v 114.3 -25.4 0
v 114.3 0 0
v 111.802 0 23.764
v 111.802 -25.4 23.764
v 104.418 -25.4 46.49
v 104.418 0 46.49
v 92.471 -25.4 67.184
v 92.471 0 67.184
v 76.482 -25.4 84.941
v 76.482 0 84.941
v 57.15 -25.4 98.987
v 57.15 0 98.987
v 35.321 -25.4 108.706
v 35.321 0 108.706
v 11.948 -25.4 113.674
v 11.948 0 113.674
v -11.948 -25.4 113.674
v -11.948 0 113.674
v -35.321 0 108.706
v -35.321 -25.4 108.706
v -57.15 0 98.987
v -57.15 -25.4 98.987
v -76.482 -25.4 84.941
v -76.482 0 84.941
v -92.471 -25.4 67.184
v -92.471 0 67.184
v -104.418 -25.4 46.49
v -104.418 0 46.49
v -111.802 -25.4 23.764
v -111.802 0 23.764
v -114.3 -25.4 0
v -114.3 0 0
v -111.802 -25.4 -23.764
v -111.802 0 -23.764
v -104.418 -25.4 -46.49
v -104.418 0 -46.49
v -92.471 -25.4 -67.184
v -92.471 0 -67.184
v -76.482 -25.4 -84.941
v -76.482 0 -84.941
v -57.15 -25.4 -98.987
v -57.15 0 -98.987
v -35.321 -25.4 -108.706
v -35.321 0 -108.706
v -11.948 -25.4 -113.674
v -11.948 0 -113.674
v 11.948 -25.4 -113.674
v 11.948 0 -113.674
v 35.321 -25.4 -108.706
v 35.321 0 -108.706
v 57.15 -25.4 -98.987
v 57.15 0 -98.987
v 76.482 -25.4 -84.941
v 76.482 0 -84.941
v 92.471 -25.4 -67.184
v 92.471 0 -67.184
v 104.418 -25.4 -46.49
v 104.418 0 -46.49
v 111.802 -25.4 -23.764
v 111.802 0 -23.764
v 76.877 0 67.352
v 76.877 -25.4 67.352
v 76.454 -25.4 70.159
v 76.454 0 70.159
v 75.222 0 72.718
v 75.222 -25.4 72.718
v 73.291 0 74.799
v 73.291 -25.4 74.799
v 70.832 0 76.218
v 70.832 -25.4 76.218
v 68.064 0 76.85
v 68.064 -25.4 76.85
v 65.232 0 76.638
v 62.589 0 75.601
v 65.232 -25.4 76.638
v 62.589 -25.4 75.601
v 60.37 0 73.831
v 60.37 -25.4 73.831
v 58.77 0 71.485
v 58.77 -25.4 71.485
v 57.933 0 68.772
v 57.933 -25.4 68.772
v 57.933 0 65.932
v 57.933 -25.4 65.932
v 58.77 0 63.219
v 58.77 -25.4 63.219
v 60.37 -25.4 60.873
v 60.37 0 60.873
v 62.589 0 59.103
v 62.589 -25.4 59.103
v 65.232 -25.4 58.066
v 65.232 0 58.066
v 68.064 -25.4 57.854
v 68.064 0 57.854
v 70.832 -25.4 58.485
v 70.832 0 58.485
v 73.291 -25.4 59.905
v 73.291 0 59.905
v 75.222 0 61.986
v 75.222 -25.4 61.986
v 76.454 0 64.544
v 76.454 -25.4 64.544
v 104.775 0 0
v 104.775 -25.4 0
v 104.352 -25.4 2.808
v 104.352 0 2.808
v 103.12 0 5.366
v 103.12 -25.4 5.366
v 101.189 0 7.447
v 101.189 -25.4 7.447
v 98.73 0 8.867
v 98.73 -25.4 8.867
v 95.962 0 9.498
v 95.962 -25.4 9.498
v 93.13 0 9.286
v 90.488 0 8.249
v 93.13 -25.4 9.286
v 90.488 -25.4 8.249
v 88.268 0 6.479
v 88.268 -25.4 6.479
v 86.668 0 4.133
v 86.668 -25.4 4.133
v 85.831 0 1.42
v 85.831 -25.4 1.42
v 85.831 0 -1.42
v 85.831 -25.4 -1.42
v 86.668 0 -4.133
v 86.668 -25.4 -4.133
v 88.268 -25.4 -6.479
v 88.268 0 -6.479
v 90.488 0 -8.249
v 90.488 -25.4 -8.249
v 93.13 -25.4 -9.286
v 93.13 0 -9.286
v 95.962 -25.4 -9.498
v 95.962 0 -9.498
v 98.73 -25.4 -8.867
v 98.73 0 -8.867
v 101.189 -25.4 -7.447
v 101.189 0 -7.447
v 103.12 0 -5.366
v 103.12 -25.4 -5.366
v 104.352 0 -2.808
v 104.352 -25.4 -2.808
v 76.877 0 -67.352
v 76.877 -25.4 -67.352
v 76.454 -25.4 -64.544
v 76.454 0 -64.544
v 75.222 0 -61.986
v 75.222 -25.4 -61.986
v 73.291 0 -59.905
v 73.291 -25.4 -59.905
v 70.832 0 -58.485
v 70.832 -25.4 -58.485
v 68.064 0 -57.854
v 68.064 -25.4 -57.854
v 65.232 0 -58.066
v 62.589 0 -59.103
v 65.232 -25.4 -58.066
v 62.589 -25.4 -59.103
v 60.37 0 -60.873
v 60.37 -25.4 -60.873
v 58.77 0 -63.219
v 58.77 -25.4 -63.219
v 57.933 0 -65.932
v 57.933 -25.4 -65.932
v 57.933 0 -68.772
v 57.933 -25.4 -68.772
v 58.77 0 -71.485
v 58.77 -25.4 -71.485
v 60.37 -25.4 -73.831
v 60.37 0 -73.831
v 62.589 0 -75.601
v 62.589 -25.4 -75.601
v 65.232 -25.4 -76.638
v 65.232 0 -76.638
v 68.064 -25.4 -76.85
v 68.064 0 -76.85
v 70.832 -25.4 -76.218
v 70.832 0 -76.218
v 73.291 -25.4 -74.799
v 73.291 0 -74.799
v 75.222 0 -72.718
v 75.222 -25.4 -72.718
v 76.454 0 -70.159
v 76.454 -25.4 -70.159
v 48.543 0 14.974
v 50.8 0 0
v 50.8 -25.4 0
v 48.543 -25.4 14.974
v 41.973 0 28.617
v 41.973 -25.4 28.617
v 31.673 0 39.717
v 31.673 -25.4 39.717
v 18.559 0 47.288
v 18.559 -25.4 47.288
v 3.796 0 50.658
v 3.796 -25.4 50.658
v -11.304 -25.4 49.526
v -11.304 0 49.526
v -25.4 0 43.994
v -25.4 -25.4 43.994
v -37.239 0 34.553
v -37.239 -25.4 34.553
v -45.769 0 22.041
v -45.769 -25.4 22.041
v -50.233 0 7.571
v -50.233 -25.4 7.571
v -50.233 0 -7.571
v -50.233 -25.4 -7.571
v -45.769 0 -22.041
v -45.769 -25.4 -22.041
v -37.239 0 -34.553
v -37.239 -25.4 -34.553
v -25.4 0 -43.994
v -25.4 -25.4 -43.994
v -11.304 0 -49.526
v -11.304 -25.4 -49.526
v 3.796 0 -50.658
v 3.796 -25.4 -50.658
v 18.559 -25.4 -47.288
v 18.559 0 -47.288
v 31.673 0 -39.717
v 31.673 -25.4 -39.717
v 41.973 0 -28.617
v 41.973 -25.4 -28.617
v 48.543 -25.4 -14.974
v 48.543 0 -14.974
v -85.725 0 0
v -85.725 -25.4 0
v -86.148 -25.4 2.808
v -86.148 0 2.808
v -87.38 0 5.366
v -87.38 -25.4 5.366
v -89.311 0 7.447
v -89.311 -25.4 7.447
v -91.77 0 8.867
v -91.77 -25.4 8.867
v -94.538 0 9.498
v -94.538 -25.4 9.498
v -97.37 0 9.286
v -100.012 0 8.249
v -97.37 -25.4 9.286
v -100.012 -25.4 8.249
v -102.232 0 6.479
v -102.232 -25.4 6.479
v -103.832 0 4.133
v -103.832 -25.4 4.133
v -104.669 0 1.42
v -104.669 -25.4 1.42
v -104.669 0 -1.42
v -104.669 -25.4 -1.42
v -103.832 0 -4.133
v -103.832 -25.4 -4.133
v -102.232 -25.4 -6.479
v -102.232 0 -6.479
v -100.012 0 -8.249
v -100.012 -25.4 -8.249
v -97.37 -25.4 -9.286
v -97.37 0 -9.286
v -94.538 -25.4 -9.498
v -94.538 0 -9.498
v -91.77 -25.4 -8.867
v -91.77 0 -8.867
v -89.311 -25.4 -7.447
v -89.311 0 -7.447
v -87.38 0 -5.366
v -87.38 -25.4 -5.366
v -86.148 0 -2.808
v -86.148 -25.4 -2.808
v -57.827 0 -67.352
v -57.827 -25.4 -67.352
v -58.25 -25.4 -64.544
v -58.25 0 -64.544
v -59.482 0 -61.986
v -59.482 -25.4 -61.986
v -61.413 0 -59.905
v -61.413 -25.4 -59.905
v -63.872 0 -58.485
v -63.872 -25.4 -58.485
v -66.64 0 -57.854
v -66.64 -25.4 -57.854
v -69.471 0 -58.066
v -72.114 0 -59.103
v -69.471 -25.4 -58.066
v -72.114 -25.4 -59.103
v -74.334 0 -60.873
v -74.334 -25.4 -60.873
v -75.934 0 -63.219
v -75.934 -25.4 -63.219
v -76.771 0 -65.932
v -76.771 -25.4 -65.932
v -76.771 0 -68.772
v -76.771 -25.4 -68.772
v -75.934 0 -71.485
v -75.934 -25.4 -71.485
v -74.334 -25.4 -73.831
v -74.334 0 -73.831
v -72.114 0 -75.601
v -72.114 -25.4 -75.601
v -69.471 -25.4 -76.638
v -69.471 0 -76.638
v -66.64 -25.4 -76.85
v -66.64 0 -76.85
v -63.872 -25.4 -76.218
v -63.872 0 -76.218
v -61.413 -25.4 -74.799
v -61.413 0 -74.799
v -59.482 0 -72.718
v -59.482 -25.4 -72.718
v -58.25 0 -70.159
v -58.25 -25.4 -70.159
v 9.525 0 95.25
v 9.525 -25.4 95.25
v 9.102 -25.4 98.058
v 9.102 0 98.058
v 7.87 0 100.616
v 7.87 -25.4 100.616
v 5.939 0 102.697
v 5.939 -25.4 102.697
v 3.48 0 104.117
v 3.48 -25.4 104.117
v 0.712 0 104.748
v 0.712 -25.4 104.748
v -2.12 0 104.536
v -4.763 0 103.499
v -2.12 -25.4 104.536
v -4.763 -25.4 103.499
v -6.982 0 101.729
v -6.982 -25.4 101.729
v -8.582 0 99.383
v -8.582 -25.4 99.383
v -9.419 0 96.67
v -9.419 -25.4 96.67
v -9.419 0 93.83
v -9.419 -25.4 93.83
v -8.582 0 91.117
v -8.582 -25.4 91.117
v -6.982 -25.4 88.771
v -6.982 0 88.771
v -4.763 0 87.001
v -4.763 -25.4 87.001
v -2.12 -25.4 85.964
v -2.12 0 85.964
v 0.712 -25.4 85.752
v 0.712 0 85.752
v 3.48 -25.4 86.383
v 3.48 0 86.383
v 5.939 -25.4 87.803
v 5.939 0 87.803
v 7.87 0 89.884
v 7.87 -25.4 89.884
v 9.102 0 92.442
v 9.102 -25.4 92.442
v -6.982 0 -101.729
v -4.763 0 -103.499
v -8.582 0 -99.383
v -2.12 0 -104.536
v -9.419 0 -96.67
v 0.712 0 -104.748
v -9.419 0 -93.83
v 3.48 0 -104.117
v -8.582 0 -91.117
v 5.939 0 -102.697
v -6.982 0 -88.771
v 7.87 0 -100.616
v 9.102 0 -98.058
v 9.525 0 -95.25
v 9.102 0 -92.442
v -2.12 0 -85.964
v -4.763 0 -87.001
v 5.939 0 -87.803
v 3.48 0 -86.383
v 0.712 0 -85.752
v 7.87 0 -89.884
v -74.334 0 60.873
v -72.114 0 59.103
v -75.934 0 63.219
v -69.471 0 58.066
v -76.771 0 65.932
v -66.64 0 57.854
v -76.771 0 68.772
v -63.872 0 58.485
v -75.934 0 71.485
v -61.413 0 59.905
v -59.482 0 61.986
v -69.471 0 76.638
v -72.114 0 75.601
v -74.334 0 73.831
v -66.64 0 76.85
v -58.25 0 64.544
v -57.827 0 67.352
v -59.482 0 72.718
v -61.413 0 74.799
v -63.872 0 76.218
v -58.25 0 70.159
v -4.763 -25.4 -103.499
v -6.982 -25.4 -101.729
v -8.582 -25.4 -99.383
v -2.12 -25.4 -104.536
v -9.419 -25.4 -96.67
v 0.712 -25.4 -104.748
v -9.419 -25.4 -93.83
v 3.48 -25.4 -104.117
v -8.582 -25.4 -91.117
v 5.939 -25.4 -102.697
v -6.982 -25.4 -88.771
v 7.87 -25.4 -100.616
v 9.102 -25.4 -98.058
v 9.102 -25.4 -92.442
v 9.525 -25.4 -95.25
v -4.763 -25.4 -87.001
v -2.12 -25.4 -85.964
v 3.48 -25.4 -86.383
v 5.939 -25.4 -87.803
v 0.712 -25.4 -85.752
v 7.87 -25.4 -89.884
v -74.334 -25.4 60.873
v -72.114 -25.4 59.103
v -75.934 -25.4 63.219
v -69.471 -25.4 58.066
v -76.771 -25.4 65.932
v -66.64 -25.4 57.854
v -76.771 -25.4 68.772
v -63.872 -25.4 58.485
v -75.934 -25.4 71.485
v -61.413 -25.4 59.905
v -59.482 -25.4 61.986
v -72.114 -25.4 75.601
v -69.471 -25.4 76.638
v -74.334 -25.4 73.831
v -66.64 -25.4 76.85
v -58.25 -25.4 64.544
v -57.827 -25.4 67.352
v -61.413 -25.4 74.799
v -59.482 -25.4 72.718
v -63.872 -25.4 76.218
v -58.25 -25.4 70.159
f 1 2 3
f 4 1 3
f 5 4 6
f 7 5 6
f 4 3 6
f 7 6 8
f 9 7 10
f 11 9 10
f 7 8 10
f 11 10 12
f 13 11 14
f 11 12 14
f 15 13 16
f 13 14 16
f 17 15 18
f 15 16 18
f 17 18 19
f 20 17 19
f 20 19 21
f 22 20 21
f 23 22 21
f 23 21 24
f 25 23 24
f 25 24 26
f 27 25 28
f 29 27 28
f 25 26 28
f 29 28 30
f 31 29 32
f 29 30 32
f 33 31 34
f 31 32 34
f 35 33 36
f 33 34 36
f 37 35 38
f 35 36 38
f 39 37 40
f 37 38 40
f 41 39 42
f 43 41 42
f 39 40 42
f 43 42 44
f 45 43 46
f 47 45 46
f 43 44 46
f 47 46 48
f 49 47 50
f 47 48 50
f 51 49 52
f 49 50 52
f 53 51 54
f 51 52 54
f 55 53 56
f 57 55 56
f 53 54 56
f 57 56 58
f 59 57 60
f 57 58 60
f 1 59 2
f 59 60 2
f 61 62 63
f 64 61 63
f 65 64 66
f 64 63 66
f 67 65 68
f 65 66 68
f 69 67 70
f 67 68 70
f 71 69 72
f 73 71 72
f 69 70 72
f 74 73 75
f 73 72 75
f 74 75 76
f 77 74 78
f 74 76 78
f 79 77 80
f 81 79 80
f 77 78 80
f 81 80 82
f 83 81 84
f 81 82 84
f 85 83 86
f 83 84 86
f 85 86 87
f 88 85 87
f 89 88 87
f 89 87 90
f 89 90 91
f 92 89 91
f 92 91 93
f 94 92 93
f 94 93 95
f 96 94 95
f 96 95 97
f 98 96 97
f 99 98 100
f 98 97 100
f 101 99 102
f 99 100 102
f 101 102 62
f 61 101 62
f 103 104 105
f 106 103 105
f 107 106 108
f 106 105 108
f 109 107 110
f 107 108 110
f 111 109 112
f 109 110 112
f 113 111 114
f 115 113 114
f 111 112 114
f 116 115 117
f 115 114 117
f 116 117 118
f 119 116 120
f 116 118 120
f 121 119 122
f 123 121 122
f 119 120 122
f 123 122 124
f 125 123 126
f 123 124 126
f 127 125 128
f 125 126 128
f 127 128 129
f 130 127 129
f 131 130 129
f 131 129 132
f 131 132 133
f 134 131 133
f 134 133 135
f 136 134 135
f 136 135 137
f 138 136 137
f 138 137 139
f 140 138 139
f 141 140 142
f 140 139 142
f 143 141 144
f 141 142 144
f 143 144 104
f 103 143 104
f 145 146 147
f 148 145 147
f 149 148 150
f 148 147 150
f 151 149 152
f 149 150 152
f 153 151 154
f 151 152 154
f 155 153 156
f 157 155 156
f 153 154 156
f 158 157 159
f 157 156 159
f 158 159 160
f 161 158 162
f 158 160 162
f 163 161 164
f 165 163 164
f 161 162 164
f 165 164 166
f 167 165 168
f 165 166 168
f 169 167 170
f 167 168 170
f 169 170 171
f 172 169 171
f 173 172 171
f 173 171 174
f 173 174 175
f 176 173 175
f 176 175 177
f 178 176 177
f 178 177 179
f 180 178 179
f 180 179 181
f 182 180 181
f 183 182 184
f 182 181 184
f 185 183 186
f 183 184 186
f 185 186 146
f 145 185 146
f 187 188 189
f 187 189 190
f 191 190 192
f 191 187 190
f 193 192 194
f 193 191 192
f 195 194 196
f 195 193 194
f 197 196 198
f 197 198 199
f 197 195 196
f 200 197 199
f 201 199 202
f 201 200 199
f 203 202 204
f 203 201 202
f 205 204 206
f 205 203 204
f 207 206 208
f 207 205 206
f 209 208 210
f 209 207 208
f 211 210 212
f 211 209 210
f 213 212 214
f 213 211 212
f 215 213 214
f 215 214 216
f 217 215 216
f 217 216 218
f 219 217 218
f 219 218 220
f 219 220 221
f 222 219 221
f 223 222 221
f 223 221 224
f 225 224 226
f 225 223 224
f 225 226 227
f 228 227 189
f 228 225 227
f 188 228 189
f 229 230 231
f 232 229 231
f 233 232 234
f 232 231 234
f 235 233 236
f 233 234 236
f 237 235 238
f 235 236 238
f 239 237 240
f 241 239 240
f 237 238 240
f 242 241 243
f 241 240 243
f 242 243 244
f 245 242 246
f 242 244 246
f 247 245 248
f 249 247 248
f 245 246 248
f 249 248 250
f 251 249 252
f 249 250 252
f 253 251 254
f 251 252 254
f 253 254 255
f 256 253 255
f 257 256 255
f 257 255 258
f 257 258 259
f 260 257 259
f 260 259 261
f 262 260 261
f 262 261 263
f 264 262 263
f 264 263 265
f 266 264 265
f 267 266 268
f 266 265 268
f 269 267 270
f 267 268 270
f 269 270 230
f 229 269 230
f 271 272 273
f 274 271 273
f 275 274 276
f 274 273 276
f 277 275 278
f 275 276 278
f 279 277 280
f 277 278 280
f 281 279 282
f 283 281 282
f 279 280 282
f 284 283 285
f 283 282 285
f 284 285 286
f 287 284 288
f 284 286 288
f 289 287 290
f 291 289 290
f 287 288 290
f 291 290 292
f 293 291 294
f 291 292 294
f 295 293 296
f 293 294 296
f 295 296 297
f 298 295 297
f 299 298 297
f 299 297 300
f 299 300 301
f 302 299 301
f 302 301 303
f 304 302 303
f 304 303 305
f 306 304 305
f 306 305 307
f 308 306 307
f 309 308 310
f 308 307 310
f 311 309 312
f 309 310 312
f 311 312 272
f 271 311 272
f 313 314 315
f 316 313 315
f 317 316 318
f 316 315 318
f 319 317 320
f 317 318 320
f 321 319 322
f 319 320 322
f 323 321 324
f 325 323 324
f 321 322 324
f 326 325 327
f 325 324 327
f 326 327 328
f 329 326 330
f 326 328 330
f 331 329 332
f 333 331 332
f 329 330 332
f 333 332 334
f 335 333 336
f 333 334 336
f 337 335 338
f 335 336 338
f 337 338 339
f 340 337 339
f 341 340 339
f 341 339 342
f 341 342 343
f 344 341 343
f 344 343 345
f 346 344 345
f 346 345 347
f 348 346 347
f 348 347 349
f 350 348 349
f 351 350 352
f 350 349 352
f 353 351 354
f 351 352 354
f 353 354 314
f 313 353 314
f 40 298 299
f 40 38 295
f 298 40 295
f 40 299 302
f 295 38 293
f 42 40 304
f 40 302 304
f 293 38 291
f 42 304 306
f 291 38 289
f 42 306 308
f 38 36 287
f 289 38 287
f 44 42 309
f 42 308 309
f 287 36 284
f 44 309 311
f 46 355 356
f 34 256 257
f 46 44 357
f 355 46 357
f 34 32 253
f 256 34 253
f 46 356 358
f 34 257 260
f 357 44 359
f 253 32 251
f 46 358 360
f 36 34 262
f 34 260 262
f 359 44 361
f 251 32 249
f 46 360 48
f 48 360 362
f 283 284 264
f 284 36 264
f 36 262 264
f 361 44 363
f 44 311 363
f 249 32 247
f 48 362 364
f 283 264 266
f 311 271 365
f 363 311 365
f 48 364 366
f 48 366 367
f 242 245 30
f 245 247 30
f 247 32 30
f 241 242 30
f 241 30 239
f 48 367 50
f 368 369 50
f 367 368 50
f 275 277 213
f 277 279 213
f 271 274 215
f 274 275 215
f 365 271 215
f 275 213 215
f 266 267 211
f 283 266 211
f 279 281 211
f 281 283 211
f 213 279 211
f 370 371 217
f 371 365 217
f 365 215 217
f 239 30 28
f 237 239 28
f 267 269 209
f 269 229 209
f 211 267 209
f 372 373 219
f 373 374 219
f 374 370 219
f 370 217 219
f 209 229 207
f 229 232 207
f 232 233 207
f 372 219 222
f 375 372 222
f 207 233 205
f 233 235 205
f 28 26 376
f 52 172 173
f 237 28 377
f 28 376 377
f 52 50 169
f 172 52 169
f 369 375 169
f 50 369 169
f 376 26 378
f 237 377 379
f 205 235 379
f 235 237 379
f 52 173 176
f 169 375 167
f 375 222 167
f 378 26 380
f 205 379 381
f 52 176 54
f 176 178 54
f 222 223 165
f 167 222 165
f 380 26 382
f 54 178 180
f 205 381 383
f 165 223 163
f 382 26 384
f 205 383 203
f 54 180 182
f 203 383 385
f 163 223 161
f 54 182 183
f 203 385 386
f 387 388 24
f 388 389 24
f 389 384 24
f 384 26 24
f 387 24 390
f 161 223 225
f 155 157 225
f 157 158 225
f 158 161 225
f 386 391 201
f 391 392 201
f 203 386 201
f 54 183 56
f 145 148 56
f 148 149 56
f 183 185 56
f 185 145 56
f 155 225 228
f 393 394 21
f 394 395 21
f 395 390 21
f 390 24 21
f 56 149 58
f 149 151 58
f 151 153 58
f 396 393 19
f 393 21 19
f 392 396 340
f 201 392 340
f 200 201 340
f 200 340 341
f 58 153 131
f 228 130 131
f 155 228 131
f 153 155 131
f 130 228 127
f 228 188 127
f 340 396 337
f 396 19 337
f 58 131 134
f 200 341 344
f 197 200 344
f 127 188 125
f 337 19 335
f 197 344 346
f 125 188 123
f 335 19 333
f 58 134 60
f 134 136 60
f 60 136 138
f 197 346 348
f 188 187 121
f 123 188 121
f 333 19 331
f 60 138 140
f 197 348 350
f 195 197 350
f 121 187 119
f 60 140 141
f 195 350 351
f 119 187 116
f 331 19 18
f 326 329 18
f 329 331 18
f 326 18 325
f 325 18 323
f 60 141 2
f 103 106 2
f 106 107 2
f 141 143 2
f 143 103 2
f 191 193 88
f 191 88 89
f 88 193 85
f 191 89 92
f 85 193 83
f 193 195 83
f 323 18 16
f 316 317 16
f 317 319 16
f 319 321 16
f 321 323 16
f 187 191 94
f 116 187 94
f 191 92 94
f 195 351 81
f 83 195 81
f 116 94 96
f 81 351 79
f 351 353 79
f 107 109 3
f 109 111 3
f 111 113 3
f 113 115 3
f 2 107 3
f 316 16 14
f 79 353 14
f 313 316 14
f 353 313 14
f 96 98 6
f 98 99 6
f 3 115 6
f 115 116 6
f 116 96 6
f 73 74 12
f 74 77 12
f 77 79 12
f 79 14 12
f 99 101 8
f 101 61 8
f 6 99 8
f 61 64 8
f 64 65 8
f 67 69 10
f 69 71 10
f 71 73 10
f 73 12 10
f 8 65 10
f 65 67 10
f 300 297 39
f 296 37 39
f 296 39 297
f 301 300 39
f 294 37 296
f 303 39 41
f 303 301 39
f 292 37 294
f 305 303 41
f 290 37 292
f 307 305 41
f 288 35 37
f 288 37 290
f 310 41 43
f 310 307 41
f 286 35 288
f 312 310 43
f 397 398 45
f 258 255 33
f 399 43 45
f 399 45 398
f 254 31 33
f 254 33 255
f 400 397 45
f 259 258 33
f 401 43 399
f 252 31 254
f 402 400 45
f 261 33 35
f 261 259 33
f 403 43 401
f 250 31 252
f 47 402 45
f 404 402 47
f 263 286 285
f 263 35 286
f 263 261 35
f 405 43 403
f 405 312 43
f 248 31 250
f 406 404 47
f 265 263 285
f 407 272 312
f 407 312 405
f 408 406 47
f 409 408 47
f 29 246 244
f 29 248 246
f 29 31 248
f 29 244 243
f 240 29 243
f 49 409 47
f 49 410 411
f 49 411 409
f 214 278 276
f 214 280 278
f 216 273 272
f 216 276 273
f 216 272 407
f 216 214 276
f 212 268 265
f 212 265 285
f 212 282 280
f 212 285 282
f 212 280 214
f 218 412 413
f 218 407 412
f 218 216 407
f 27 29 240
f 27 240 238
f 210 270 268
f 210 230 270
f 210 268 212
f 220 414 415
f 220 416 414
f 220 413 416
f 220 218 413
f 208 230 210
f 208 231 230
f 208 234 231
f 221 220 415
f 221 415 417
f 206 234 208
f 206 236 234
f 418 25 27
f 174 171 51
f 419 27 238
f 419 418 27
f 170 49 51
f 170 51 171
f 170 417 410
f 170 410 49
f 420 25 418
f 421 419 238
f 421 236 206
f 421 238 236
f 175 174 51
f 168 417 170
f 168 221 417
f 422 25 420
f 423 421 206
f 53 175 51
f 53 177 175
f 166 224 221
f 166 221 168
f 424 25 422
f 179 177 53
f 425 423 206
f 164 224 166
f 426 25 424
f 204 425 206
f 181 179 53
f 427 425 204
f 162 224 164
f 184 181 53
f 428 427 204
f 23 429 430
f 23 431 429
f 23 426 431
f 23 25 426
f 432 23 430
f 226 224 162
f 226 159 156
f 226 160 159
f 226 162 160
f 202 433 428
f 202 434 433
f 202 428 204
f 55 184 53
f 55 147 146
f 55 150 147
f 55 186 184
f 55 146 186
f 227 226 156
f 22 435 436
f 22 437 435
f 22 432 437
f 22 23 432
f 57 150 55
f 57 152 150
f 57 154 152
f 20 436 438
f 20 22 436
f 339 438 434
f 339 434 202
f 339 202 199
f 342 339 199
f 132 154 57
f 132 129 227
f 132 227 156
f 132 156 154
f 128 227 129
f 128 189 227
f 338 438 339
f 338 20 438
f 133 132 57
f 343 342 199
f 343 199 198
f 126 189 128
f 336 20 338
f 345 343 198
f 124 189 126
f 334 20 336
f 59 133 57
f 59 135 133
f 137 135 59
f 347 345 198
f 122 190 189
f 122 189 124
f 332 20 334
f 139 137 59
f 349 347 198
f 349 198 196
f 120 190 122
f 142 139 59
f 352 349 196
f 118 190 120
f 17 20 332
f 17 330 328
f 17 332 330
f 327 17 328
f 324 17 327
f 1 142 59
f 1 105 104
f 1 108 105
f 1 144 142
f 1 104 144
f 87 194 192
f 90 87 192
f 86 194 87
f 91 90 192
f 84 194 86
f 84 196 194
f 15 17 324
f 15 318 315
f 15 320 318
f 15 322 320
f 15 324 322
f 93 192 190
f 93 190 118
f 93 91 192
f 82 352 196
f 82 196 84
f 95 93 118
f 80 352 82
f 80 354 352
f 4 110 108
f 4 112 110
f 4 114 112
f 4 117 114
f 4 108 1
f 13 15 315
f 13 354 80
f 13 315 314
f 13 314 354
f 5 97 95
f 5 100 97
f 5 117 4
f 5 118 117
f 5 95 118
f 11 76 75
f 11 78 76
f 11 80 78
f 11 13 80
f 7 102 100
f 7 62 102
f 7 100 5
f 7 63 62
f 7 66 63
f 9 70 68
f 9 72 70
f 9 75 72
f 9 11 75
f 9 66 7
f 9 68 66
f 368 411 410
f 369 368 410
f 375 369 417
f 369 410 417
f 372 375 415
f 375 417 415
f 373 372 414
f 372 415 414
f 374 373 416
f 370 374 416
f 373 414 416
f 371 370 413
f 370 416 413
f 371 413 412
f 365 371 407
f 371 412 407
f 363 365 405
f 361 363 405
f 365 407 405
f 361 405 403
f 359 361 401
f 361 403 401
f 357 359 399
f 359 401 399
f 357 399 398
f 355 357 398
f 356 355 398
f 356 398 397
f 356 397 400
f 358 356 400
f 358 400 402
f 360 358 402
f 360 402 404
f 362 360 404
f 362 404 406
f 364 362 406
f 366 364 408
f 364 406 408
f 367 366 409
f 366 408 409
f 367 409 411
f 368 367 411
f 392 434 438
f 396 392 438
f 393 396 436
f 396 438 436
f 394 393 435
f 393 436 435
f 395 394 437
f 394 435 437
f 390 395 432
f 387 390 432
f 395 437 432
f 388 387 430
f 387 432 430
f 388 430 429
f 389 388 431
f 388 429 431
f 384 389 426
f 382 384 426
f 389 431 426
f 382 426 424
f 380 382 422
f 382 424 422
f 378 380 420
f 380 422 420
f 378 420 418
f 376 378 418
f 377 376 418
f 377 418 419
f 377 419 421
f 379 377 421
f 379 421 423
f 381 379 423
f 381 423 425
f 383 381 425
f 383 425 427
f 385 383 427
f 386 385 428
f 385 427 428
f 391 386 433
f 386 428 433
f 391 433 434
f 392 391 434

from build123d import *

# Parameters (mm, degrees)
F0_R     = 114.3
F0_R_2   = 50.8
F1_DEPTH = 25.4
F2_R     = 9.525
F3_DEPTH = 25.4


with BuildPart() as f1:
    # F0 (on Front) → F1 (new body)
    with BuildSketch(Plane.XZ):
        Circle(F0_R)
        Circle(F0_R_2, mode=Mode.SUBTRACT)
    extrude(amount=F1_DEPTH)

    # F2 (on face) → F3 (cut, through all)
    with BuildSketch(Plane.XZ.offset(25.4)):
        with Locations((0, 95.25)):
            Circle(F2_R)
        with Locations((-67.351921, 67.351921)):
            Circle(F2_R)
        with Locations((-95.25, 0)):
            Circle(F2_R)
        with Locations((-67.351921, -67.351921)):
            Circle(F2_R)
        with Locations((0, -95.25)):
            Circle(F2_R)
        with Locations((67.351921, -67.351921)):
            Circle(F2_R)
        with Locations((95.25, 0)):
            Circle(F2_R)
        with Locations((67.351921, 67.351921)):
            Circle(F2_R)
    extrude(amount=-F3_DEPTH, mode=Mode.SUBTRACT)


solid = f1.part
